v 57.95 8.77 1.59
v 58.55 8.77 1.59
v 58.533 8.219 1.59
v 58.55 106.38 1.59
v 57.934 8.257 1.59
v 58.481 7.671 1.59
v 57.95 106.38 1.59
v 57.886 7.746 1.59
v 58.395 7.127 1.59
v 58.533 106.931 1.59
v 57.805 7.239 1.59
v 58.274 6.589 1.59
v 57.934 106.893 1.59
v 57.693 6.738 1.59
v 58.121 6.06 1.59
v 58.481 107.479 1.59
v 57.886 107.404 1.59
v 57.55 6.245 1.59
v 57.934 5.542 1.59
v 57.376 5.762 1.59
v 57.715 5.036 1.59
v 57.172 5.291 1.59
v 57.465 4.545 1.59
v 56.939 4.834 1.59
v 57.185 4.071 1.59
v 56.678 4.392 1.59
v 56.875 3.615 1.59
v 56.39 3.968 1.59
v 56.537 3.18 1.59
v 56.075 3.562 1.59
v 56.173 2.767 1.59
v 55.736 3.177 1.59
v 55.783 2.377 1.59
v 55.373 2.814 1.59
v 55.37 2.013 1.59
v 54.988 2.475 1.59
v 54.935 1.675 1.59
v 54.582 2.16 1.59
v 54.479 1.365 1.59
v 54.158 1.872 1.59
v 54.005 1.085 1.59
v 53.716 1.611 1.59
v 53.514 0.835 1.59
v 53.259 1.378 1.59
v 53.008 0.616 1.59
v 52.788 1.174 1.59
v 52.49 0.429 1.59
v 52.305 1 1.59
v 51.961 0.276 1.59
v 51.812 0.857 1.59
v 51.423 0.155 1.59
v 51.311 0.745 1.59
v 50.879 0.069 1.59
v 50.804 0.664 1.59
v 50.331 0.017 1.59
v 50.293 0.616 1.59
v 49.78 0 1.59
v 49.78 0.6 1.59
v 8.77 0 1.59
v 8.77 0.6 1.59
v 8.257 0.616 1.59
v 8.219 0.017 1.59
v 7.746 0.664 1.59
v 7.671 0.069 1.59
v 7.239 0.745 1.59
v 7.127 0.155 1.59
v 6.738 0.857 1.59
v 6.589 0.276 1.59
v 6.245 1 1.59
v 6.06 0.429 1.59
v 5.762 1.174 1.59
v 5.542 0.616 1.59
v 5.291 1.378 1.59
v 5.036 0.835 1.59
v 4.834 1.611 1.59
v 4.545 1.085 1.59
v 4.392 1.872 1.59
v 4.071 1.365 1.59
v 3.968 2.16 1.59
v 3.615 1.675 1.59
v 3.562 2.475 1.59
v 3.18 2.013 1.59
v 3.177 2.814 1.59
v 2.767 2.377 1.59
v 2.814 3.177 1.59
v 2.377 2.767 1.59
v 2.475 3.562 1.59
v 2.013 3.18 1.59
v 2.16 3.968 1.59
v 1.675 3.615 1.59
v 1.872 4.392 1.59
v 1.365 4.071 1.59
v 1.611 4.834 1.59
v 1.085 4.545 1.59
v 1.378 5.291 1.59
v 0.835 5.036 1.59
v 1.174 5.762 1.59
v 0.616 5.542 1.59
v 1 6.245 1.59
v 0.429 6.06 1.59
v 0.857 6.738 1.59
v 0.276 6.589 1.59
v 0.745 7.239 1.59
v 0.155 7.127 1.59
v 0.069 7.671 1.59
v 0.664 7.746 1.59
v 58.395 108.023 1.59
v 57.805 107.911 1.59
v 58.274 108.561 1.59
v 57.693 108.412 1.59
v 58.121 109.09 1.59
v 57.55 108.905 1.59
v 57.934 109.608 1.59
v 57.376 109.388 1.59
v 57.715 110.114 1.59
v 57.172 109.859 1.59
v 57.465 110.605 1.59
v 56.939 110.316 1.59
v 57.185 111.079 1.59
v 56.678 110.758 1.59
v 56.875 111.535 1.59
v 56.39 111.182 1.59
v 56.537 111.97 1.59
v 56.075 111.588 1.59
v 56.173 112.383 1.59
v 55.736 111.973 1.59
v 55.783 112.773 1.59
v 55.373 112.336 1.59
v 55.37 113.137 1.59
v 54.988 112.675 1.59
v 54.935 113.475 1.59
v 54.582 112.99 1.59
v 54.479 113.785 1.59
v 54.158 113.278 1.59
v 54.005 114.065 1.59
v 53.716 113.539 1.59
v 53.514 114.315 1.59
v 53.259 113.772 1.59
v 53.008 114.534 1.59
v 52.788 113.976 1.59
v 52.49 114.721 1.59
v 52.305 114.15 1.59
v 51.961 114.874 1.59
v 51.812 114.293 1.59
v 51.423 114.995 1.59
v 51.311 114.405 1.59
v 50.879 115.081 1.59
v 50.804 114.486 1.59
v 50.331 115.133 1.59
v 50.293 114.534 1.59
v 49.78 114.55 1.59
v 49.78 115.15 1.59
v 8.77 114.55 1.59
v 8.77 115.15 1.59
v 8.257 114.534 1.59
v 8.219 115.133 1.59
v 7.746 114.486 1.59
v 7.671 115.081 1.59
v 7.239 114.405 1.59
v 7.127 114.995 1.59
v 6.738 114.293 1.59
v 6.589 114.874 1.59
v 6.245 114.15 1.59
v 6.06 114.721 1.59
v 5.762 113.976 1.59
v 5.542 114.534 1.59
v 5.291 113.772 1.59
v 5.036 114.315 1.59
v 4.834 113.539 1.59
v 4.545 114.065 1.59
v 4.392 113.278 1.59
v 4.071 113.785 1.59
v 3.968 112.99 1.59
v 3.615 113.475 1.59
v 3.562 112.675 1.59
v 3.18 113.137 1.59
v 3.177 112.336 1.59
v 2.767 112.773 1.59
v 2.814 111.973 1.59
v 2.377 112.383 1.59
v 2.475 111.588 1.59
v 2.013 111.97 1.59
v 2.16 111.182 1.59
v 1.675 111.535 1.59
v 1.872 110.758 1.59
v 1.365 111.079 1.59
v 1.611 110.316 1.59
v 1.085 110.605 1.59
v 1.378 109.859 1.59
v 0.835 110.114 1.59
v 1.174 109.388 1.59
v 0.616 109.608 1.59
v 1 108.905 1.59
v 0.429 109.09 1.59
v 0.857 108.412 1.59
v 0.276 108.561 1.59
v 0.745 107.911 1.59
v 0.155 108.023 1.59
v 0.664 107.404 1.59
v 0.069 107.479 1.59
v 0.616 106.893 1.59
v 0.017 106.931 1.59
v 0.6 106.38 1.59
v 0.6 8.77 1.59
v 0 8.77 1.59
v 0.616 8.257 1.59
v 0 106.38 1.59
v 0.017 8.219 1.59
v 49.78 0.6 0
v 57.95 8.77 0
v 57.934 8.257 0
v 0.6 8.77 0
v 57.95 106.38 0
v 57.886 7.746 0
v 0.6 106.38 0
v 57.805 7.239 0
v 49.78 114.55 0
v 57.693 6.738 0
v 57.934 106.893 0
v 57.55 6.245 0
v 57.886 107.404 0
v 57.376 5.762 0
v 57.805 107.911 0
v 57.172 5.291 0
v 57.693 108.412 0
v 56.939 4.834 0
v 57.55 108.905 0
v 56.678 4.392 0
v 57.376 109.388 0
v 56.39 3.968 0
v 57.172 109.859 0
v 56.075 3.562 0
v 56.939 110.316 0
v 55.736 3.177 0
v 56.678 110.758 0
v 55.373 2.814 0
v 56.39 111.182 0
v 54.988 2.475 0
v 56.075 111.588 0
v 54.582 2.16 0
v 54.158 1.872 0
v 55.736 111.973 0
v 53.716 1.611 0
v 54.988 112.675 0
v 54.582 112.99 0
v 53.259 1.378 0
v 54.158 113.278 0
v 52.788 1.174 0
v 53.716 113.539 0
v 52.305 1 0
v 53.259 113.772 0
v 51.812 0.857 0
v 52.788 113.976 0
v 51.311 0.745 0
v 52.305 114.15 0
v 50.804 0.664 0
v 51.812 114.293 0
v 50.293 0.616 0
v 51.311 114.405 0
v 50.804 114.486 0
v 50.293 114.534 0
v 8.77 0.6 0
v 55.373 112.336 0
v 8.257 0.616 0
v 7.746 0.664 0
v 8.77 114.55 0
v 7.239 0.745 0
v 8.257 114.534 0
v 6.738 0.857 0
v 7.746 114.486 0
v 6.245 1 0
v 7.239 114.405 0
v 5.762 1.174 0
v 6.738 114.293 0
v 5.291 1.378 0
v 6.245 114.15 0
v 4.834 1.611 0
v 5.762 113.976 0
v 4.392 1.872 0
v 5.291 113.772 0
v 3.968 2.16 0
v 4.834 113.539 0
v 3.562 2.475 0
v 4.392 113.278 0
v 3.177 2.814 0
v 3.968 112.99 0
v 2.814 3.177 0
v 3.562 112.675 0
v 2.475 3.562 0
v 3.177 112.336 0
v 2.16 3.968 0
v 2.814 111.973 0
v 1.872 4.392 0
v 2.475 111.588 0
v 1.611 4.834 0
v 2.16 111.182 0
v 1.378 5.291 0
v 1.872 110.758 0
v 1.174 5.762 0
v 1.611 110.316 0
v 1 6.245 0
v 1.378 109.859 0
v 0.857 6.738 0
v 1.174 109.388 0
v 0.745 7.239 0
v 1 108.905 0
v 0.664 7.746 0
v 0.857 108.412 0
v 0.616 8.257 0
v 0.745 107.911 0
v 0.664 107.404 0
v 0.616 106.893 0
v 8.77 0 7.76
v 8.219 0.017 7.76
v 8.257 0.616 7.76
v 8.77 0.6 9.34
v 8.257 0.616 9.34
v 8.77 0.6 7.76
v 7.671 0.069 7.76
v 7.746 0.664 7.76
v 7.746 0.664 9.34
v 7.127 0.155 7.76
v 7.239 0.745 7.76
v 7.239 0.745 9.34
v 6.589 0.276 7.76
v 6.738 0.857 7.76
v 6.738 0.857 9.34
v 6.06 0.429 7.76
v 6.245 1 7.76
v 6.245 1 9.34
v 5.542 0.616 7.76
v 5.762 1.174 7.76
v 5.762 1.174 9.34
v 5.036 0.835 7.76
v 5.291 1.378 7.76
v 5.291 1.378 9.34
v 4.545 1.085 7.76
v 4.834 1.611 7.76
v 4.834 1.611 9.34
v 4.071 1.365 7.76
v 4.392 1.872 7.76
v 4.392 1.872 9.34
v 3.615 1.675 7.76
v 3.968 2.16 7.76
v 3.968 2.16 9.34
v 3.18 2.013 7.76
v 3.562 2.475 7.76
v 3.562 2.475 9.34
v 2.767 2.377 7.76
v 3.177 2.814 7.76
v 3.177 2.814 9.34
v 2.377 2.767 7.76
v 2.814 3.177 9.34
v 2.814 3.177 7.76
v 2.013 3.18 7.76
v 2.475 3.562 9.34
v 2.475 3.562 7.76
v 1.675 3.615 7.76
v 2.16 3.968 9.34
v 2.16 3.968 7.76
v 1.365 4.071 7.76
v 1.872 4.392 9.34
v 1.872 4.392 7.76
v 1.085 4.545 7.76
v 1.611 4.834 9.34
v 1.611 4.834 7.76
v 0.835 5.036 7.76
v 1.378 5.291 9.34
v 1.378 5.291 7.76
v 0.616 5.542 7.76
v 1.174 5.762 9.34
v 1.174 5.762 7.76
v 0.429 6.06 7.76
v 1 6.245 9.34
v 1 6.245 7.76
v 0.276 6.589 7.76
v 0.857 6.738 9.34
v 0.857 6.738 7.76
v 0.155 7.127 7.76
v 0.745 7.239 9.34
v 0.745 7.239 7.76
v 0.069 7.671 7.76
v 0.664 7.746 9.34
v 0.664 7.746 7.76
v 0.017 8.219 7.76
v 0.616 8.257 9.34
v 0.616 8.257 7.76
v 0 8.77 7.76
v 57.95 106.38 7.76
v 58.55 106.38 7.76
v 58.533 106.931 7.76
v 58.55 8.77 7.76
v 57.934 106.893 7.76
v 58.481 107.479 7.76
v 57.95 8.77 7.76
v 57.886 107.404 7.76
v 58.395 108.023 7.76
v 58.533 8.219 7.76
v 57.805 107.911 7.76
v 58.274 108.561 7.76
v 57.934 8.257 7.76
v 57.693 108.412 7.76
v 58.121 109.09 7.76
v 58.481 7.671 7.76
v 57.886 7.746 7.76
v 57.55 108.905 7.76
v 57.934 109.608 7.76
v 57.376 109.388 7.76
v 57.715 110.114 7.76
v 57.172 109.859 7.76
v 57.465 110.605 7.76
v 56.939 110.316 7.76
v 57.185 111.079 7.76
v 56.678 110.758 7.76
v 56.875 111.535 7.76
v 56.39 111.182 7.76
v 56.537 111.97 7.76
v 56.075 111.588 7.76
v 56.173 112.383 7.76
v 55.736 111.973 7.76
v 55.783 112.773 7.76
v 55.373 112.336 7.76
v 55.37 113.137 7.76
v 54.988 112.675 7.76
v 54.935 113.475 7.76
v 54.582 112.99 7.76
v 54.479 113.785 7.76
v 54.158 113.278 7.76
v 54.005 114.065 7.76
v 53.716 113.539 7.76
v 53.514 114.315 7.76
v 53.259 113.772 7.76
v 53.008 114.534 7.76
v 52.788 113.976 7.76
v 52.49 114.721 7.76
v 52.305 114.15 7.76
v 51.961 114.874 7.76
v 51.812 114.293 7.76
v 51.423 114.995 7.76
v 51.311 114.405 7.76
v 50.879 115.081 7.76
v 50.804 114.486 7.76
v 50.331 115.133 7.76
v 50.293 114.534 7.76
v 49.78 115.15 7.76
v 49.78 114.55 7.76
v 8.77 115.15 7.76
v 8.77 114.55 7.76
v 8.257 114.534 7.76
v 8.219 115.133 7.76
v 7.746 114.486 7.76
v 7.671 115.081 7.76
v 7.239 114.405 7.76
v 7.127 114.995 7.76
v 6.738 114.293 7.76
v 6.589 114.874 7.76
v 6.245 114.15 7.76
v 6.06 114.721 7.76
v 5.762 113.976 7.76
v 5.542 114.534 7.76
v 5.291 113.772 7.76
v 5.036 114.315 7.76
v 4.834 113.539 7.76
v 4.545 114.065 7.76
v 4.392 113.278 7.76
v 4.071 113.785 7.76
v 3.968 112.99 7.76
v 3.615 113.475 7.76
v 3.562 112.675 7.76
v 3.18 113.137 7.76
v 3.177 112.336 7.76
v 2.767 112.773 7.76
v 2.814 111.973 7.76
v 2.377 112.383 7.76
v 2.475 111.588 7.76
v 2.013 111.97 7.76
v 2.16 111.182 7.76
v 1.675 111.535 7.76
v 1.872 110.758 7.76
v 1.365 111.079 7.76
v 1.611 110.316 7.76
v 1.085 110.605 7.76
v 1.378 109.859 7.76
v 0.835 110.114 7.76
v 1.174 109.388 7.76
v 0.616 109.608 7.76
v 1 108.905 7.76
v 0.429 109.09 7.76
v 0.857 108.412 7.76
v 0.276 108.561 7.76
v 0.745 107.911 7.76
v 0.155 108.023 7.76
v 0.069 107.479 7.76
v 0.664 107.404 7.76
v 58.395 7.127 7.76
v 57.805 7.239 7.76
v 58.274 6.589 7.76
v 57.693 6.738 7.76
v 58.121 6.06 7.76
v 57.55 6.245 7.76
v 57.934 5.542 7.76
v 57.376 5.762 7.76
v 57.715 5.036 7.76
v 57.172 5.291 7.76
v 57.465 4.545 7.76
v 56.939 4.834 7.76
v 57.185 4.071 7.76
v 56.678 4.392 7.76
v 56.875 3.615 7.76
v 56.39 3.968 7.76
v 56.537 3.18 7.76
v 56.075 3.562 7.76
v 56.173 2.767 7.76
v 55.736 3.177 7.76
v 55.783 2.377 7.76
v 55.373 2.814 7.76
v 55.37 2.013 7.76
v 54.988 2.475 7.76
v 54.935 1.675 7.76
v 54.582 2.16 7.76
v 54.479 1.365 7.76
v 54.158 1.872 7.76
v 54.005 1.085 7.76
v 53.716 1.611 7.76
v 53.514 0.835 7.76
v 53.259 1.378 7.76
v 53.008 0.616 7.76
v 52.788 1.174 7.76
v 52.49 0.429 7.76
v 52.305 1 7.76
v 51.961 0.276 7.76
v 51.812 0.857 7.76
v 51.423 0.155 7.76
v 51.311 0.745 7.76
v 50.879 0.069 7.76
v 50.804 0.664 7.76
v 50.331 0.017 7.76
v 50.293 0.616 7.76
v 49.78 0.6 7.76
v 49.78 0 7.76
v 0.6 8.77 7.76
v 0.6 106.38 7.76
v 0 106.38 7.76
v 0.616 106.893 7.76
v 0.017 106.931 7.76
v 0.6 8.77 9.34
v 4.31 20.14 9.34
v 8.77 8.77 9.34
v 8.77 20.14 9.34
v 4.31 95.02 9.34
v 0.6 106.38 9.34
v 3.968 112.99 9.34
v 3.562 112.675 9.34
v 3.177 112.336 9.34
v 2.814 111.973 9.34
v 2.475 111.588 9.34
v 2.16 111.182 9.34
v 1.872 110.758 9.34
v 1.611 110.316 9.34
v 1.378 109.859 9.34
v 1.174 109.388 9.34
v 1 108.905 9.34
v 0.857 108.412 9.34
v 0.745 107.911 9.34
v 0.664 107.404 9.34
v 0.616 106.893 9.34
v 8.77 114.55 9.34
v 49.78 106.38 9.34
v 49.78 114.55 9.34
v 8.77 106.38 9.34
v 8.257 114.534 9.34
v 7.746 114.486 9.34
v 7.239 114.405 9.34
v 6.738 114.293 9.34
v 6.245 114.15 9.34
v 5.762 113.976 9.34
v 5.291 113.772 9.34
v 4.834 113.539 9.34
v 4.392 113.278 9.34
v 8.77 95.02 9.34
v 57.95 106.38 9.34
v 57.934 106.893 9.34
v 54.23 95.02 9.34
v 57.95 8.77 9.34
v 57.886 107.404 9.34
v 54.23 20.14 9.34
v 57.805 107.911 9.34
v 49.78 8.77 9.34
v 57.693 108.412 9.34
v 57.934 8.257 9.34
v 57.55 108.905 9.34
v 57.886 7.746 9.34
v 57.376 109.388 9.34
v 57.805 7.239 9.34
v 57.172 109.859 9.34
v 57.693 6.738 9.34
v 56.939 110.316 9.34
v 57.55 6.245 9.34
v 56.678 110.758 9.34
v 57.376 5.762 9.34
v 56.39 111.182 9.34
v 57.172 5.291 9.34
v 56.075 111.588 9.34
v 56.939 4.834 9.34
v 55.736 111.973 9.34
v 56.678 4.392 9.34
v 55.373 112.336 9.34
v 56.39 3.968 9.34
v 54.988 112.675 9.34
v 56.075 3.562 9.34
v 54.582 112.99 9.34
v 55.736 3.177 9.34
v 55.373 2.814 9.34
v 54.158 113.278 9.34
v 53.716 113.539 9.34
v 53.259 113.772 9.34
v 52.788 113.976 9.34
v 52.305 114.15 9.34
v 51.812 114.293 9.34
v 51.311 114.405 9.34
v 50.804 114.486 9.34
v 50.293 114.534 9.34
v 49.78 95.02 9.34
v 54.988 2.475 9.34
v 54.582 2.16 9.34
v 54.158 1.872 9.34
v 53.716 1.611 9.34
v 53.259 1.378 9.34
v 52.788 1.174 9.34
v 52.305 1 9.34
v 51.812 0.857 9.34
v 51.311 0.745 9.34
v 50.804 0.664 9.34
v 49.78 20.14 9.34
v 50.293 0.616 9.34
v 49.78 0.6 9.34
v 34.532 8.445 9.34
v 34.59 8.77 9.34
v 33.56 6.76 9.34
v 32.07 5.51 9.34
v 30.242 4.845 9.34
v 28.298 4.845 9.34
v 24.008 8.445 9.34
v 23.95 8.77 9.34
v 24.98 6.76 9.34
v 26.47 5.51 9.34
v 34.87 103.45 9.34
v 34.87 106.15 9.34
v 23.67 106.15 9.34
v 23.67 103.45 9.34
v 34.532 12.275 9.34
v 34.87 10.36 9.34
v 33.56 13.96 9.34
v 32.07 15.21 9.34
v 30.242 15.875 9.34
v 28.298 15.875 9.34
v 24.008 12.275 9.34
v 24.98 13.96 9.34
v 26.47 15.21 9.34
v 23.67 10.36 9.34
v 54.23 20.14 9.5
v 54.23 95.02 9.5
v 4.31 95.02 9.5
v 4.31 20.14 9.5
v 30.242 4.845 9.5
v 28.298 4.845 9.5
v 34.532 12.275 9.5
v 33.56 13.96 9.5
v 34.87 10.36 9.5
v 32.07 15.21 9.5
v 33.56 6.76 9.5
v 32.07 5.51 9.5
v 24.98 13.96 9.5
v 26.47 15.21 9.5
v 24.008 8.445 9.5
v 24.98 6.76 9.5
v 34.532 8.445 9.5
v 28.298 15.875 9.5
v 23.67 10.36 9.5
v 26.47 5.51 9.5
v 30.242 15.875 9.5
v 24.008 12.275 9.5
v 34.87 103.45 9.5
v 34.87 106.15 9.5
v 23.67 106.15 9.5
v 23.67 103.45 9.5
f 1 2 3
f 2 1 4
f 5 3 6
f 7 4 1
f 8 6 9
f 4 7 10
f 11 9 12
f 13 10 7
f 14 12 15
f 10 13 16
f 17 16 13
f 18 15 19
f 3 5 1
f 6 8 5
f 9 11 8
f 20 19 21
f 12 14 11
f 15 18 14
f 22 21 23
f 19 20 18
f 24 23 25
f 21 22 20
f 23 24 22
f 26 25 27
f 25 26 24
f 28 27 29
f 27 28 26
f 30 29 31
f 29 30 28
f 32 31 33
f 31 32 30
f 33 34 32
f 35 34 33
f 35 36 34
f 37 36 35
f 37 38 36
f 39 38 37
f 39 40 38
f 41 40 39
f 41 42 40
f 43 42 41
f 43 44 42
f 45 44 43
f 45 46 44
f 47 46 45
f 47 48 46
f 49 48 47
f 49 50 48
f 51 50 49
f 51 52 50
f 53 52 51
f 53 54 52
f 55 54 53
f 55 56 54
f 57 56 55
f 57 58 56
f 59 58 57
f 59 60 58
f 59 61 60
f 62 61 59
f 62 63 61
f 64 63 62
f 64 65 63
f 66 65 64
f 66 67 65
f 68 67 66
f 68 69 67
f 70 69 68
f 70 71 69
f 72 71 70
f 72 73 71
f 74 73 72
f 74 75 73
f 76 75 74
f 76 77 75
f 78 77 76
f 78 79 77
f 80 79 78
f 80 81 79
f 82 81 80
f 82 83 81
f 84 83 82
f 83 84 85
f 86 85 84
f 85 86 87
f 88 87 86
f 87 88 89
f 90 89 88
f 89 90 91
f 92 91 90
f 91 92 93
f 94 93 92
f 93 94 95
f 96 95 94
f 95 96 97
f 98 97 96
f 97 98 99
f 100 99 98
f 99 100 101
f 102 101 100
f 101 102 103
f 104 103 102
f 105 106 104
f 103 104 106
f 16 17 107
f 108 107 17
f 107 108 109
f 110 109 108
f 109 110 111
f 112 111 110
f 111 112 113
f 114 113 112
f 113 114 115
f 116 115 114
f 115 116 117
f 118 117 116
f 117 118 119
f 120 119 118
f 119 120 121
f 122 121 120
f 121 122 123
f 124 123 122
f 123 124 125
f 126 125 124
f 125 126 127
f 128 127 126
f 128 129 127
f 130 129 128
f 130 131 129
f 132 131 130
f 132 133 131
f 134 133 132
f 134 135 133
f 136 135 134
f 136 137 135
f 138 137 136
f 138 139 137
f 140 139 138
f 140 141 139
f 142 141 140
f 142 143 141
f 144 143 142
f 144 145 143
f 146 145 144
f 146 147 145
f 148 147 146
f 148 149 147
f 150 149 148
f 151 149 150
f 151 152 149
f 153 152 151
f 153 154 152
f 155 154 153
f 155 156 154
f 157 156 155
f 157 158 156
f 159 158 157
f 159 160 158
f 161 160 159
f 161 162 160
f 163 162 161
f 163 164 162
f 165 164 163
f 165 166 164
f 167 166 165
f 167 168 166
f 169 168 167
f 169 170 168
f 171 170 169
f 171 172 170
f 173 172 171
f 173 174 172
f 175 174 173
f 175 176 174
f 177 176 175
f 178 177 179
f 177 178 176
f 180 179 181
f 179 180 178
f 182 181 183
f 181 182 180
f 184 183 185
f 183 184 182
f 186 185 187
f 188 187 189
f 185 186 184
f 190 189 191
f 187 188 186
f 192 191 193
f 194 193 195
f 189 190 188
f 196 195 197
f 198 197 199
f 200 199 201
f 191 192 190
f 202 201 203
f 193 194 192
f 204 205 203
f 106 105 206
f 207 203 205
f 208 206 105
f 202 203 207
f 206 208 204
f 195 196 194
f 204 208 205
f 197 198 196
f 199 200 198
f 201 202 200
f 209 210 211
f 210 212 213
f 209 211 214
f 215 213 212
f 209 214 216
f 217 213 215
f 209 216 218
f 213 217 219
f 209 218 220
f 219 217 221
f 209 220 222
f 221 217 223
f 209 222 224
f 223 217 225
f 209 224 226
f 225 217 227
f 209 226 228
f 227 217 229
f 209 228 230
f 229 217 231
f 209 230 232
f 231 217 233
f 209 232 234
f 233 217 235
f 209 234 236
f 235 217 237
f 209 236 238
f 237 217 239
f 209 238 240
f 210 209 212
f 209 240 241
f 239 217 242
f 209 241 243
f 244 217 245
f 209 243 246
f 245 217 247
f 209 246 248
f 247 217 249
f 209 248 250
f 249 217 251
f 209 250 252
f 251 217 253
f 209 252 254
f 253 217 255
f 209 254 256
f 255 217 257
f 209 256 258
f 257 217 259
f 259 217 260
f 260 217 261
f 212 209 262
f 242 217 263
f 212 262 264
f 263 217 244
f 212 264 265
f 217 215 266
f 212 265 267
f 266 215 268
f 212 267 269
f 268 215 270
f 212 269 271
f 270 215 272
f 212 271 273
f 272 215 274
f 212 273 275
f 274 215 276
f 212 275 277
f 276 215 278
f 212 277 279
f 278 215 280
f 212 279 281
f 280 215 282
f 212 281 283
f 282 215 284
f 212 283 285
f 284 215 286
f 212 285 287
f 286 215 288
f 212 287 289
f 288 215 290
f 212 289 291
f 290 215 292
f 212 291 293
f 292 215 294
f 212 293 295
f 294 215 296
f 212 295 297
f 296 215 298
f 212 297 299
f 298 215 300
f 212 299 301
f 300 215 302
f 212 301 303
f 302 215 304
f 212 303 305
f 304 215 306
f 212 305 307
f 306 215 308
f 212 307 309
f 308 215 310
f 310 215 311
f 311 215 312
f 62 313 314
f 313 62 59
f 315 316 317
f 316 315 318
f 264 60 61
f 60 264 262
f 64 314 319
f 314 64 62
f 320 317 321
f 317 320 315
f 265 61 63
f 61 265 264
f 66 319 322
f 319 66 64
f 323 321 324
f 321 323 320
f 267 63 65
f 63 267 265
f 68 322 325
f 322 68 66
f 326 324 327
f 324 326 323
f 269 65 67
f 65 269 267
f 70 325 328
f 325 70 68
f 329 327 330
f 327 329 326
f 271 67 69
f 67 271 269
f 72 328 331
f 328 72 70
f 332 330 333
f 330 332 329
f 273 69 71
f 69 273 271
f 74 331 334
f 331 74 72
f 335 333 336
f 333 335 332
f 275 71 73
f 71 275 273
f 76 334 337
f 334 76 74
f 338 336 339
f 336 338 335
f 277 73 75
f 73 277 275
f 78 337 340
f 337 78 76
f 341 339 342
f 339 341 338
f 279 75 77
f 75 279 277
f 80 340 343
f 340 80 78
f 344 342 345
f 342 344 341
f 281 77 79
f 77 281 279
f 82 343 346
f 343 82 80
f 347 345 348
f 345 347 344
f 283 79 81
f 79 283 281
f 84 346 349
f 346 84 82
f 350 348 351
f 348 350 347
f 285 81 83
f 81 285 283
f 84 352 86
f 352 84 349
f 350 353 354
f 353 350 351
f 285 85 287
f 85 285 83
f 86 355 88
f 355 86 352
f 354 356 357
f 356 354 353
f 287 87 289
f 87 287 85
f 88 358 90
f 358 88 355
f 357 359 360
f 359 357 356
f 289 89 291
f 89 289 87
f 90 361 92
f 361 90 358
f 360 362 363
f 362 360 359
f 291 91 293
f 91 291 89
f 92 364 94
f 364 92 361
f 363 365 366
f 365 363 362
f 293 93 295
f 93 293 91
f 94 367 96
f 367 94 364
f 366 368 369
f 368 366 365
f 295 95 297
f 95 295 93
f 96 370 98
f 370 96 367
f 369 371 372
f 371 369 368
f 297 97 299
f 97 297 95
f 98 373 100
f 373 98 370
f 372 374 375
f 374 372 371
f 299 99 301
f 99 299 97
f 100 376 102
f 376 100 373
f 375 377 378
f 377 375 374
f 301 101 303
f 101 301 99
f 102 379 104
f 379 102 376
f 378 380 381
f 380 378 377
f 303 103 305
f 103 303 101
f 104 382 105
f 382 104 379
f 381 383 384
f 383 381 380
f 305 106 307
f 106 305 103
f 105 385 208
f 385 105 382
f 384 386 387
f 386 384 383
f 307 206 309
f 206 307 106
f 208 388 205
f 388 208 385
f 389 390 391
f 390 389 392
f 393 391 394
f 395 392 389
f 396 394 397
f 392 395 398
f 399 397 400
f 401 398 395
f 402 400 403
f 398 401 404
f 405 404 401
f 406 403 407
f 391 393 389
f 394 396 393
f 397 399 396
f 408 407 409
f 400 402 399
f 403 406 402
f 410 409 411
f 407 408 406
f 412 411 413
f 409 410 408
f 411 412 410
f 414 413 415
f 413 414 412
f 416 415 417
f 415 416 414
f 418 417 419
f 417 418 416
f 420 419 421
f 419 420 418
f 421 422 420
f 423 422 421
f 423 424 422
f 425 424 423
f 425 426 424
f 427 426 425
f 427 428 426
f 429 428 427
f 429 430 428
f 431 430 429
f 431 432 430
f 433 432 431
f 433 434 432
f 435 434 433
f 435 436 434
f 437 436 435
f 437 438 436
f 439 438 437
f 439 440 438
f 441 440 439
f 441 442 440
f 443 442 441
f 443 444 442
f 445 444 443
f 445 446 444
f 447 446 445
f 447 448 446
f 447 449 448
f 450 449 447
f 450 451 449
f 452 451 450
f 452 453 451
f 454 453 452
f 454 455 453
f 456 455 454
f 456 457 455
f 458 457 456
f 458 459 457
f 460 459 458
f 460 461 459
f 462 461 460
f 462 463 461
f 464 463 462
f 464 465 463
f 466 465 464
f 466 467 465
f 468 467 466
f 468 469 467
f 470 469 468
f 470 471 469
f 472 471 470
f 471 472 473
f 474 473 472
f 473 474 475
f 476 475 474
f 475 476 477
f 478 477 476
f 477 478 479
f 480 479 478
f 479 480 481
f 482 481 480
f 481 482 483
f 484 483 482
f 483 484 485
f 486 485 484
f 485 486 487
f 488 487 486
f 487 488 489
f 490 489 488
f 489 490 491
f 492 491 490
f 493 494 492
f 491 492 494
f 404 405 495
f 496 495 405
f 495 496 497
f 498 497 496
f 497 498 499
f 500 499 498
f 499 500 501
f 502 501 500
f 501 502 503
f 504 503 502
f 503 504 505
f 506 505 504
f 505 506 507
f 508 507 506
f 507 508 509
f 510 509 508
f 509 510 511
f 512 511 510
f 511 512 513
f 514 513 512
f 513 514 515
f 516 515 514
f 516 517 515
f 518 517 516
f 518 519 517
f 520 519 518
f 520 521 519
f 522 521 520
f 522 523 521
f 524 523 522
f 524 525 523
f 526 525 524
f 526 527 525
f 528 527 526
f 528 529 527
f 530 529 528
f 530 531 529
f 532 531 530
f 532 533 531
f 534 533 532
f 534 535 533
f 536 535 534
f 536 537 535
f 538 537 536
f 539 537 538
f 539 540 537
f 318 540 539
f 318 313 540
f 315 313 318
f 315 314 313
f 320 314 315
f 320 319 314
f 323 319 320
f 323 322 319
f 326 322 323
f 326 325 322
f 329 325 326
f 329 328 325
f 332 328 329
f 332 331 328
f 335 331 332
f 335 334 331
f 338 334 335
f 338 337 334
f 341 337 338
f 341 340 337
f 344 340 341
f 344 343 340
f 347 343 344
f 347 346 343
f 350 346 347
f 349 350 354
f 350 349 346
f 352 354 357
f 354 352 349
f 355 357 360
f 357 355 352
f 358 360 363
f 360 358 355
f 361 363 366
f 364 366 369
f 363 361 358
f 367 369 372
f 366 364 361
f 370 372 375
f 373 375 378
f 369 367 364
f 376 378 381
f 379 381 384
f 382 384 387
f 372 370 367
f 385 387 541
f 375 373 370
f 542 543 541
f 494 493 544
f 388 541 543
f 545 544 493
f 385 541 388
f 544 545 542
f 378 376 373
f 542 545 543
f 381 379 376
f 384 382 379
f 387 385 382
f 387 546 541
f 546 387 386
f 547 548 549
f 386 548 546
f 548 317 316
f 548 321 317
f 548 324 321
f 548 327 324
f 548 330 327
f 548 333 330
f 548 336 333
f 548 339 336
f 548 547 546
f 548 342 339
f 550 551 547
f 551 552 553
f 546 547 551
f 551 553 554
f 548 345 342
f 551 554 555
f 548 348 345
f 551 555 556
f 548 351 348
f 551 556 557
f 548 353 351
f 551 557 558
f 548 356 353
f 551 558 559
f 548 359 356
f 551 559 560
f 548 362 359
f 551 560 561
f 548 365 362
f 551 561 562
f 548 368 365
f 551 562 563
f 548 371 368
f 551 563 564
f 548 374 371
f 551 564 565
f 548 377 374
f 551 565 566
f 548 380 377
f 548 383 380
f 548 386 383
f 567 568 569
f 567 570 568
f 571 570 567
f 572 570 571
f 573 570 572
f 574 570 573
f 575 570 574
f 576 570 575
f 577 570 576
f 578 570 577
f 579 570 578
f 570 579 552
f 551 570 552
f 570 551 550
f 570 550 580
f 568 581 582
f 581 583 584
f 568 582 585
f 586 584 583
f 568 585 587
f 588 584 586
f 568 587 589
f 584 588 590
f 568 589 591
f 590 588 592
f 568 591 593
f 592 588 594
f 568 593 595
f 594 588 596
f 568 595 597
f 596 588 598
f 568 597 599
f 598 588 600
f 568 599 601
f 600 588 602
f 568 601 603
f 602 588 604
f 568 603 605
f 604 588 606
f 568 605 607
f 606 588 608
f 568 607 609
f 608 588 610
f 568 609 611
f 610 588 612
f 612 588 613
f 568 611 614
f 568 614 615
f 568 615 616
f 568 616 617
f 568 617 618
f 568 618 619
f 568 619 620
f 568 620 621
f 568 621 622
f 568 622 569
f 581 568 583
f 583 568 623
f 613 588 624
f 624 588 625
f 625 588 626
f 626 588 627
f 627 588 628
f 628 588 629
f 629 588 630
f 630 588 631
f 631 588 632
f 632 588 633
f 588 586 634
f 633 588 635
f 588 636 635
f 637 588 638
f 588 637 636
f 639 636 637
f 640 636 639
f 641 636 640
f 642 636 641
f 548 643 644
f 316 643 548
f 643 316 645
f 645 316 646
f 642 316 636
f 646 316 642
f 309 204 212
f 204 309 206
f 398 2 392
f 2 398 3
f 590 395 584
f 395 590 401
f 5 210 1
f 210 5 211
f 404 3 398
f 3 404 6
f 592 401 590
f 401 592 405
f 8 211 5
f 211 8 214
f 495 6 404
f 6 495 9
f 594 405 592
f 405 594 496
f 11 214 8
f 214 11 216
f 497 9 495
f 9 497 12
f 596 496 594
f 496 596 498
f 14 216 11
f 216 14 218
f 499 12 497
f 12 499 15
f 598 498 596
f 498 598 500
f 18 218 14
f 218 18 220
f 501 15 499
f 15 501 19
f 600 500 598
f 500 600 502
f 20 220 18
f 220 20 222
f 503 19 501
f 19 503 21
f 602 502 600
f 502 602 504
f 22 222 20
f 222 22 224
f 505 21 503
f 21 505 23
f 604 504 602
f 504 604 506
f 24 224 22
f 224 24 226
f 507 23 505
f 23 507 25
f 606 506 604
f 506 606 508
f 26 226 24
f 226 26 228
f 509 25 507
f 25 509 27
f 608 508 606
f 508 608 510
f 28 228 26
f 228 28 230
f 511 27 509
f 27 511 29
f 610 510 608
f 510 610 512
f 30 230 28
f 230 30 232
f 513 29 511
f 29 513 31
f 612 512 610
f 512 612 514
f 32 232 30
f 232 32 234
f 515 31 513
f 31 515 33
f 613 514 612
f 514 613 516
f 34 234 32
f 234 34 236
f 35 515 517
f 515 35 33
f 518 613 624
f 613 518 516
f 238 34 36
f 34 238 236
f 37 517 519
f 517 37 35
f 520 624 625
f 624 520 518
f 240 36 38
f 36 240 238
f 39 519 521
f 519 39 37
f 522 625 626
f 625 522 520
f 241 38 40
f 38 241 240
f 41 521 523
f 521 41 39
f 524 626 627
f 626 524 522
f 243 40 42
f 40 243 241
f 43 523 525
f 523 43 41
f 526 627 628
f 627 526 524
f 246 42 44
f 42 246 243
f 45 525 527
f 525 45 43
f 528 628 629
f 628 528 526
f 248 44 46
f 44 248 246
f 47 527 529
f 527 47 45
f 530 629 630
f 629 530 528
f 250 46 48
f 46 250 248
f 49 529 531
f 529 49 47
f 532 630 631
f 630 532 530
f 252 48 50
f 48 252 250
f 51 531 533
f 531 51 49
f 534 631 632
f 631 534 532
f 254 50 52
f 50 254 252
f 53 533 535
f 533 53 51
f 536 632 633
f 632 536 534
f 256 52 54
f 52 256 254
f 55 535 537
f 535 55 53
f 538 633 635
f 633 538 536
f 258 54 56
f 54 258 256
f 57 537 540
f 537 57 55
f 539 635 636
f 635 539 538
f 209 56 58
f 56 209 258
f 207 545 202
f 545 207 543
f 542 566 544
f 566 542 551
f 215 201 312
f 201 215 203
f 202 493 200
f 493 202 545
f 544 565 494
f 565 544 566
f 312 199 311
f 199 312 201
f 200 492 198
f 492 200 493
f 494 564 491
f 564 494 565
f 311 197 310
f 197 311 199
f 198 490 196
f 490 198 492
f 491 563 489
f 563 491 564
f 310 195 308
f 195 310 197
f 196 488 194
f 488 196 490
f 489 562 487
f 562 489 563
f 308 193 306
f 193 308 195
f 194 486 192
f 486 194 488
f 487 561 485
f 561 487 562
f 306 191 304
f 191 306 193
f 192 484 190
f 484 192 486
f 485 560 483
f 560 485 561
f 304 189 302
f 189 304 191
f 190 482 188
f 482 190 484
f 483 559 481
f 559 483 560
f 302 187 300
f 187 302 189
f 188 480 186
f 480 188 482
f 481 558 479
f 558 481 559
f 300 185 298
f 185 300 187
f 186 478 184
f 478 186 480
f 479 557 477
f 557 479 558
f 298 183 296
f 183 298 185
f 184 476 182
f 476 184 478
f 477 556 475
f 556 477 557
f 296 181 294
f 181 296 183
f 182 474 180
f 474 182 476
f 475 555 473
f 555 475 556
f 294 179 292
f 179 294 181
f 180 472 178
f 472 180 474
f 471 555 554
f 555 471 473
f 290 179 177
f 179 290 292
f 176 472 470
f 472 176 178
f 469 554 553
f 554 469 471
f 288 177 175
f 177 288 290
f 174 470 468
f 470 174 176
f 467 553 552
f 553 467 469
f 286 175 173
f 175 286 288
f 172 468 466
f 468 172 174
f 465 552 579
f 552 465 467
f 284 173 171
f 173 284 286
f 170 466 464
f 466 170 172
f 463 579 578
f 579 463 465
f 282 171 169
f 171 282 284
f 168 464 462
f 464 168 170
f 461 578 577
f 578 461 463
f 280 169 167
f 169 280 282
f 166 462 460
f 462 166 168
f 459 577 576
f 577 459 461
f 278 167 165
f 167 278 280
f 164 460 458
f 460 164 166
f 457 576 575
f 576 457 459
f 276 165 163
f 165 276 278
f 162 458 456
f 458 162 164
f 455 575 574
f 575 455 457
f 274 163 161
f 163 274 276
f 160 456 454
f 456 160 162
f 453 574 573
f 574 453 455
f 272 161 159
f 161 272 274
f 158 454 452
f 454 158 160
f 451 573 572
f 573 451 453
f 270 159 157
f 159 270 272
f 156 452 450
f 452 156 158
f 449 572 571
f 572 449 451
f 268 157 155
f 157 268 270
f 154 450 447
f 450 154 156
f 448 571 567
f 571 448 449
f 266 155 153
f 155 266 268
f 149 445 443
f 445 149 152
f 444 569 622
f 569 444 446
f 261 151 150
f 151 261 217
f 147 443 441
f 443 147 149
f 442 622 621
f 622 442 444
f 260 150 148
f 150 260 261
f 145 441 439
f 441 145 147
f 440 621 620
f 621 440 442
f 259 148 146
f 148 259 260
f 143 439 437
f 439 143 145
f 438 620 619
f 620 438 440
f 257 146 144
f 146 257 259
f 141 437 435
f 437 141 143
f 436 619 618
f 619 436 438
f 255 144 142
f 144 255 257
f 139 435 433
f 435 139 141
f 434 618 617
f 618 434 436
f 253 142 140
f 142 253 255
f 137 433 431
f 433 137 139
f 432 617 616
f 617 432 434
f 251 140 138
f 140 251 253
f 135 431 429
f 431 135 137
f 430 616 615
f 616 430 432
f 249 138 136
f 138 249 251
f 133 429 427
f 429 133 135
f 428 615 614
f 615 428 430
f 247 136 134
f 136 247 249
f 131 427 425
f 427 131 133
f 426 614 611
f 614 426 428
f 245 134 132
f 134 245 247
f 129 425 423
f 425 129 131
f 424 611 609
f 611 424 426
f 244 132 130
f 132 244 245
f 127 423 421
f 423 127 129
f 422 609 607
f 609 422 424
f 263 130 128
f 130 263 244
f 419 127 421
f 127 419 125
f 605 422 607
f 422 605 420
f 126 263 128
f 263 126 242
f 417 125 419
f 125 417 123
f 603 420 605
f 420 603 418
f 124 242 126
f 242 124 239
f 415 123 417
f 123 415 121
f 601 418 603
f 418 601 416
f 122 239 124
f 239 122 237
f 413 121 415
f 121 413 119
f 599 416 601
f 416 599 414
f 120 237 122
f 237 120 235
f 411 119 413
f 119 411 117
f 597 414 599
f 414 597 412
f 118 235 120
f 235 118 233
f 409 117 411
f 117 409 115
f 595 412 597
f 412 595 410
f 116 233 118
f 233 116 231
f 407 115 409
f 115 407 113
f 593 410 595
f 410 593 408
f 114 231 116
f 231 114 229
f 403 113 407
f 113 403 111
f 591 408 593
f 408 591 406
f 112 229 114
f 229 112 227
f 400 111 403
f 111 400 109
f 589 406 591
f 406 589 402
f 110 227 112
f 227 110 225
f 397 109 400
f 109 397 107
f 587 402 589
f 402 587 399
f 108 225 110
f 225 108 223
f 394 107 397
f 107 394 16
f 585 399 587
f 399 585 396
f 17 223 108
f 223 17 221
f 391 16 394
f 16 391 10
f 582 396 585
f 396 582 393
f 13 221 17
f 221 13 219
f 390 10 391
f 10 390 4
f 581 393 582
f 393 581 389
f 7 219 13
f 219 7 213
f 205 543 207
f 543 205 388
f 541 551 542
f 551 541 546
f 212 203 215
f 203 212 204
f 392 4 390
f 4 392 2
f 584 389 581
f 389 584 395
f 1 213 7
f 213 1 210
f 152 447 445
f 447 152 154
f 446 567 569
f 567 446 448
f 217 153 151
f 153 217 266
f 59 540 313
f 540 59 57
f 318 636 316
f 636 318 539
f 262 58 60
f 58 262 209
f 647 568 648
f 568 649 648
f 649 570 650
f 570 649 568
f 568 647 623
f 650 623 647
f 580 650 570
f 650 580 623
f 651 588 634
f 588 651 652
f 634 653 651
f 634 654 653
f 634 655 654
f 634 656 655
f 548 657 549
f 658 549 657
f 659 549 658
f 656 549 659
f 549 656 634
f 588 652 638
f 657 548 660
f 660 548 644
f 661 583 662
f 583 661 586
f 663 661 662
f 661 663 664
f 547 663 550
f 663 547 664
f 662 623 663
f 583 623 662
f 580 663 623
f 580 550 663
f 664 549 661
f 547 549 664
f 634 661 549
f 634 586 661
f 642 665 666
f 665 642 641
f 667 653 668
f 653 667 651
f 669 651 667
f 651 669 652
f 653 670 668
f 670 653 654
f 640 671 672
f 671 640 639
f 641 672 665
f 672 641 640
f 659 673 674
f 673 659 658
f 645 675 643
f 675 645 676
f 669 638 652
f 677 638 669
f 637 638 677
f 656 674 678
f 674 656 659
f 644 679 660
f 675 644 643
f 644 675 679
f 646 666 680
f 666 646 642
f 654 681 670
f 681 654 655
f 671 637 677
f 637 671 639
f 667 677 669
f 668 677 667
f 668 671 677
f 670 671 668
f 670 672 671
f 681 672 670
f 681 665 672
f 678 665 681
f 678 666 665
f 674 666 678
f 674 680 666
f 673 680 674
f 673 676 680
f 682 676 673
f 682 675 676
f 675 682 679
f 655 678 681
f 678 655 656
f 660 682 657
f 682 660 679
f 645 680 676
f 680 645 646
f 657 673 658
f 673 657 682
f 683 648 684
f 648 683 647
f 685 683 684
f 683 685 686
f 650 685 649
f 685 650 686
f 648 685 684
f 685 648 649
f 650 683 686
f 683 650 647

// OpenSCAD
// iPhone edge profile dimensions

module profile() {

polygon(points = [
[0,0],[8.17,0],[8.17,1.59],[8.77,1.59],

[8.77,7.76],[8.17,7.76],[8.17,9.34],[0,9.34]],
paths = [[0,1,2,3,4,5,6,7]]);

}

module side(l) {
	translate([0,l/2,0]) {
		rotate(90,[1,0,0]) {
			linear_extrude(height = l, center = true, convexity = 10, twist = 0) 		
			{
			profile();
			}
		}
	}
}


module corner() {
	rotate_extrude(convexity = 10, $fn = 100) {
		translate([0,0,0]) {
			profile();
		}
	}
}


// iPhone Dimension Constants

len = 115.15;
wid = 58.55;
radii = 8.77;


/* iPhone Part Functions */

module sBody() {

//left side



translate([radii,len-radii,0]) {
	rotate(180) {
		side(len-(2*radii));
	}
}



//right side

translate([wid-radii,radii,0]) {
	rotate(0,[0,0,1]) {
		side(len-(2*radii)); 
	}
}

//top side

translate([wid-radii,115.15-radii,0]) {
	rotate(90,[0,0,1]) {
		side(wid-(2*radii)); 
	}
}

//bottom side

translate([radii,radii,0]) {
	rotate(270,[0,0,1]) {
		side(wid-(2*radii)); 
	}
}

}

module corners() {

//bottom left corner

translate([radii,radii,0]) {
	rotate(0,[0,0,0]) {
		corner();
	}
}

//bottom right corner

translate([wid-radii,radii,0]) {
	rotate(0,[0,0,0]) {
		corner();
	}
}

//top left corner

translate([radii,len-radii,0]) {
	rotate(0,[0,0,0]) {
		corner();
	}
}

//top right corner

translate([wid-radii,len-radii,0]) {
	rotate(0,[0,0,0]) {
		corner();
	}
}

 

}


/* Make the iPhone */

//phone body

color([0.2,0.2,0.2]) {

corners();
sBody();
translate([radii,radii,0]) {
	cube([58.55-(2*radii),115.15-(2*radii),9.34]); //fill the middle
}
}

//screen

color([0.25,0.25,0.25]) {
	translate([4.31,20.14,0]) {
		cube([49.92,74.88,9.5]);
	}
}

//home button

color([0.18,0.18,0.18]) {
	translate([29.27,10.36,9]) {
		cylinder(r=11.2/2,h=1, center=true);
	}
}

//microphone

color([0.18,0.18,0.18]) {
	translate([29.27,104.8,9]) {
		cube([11.20,2.70,1],center=true);
	}
}
